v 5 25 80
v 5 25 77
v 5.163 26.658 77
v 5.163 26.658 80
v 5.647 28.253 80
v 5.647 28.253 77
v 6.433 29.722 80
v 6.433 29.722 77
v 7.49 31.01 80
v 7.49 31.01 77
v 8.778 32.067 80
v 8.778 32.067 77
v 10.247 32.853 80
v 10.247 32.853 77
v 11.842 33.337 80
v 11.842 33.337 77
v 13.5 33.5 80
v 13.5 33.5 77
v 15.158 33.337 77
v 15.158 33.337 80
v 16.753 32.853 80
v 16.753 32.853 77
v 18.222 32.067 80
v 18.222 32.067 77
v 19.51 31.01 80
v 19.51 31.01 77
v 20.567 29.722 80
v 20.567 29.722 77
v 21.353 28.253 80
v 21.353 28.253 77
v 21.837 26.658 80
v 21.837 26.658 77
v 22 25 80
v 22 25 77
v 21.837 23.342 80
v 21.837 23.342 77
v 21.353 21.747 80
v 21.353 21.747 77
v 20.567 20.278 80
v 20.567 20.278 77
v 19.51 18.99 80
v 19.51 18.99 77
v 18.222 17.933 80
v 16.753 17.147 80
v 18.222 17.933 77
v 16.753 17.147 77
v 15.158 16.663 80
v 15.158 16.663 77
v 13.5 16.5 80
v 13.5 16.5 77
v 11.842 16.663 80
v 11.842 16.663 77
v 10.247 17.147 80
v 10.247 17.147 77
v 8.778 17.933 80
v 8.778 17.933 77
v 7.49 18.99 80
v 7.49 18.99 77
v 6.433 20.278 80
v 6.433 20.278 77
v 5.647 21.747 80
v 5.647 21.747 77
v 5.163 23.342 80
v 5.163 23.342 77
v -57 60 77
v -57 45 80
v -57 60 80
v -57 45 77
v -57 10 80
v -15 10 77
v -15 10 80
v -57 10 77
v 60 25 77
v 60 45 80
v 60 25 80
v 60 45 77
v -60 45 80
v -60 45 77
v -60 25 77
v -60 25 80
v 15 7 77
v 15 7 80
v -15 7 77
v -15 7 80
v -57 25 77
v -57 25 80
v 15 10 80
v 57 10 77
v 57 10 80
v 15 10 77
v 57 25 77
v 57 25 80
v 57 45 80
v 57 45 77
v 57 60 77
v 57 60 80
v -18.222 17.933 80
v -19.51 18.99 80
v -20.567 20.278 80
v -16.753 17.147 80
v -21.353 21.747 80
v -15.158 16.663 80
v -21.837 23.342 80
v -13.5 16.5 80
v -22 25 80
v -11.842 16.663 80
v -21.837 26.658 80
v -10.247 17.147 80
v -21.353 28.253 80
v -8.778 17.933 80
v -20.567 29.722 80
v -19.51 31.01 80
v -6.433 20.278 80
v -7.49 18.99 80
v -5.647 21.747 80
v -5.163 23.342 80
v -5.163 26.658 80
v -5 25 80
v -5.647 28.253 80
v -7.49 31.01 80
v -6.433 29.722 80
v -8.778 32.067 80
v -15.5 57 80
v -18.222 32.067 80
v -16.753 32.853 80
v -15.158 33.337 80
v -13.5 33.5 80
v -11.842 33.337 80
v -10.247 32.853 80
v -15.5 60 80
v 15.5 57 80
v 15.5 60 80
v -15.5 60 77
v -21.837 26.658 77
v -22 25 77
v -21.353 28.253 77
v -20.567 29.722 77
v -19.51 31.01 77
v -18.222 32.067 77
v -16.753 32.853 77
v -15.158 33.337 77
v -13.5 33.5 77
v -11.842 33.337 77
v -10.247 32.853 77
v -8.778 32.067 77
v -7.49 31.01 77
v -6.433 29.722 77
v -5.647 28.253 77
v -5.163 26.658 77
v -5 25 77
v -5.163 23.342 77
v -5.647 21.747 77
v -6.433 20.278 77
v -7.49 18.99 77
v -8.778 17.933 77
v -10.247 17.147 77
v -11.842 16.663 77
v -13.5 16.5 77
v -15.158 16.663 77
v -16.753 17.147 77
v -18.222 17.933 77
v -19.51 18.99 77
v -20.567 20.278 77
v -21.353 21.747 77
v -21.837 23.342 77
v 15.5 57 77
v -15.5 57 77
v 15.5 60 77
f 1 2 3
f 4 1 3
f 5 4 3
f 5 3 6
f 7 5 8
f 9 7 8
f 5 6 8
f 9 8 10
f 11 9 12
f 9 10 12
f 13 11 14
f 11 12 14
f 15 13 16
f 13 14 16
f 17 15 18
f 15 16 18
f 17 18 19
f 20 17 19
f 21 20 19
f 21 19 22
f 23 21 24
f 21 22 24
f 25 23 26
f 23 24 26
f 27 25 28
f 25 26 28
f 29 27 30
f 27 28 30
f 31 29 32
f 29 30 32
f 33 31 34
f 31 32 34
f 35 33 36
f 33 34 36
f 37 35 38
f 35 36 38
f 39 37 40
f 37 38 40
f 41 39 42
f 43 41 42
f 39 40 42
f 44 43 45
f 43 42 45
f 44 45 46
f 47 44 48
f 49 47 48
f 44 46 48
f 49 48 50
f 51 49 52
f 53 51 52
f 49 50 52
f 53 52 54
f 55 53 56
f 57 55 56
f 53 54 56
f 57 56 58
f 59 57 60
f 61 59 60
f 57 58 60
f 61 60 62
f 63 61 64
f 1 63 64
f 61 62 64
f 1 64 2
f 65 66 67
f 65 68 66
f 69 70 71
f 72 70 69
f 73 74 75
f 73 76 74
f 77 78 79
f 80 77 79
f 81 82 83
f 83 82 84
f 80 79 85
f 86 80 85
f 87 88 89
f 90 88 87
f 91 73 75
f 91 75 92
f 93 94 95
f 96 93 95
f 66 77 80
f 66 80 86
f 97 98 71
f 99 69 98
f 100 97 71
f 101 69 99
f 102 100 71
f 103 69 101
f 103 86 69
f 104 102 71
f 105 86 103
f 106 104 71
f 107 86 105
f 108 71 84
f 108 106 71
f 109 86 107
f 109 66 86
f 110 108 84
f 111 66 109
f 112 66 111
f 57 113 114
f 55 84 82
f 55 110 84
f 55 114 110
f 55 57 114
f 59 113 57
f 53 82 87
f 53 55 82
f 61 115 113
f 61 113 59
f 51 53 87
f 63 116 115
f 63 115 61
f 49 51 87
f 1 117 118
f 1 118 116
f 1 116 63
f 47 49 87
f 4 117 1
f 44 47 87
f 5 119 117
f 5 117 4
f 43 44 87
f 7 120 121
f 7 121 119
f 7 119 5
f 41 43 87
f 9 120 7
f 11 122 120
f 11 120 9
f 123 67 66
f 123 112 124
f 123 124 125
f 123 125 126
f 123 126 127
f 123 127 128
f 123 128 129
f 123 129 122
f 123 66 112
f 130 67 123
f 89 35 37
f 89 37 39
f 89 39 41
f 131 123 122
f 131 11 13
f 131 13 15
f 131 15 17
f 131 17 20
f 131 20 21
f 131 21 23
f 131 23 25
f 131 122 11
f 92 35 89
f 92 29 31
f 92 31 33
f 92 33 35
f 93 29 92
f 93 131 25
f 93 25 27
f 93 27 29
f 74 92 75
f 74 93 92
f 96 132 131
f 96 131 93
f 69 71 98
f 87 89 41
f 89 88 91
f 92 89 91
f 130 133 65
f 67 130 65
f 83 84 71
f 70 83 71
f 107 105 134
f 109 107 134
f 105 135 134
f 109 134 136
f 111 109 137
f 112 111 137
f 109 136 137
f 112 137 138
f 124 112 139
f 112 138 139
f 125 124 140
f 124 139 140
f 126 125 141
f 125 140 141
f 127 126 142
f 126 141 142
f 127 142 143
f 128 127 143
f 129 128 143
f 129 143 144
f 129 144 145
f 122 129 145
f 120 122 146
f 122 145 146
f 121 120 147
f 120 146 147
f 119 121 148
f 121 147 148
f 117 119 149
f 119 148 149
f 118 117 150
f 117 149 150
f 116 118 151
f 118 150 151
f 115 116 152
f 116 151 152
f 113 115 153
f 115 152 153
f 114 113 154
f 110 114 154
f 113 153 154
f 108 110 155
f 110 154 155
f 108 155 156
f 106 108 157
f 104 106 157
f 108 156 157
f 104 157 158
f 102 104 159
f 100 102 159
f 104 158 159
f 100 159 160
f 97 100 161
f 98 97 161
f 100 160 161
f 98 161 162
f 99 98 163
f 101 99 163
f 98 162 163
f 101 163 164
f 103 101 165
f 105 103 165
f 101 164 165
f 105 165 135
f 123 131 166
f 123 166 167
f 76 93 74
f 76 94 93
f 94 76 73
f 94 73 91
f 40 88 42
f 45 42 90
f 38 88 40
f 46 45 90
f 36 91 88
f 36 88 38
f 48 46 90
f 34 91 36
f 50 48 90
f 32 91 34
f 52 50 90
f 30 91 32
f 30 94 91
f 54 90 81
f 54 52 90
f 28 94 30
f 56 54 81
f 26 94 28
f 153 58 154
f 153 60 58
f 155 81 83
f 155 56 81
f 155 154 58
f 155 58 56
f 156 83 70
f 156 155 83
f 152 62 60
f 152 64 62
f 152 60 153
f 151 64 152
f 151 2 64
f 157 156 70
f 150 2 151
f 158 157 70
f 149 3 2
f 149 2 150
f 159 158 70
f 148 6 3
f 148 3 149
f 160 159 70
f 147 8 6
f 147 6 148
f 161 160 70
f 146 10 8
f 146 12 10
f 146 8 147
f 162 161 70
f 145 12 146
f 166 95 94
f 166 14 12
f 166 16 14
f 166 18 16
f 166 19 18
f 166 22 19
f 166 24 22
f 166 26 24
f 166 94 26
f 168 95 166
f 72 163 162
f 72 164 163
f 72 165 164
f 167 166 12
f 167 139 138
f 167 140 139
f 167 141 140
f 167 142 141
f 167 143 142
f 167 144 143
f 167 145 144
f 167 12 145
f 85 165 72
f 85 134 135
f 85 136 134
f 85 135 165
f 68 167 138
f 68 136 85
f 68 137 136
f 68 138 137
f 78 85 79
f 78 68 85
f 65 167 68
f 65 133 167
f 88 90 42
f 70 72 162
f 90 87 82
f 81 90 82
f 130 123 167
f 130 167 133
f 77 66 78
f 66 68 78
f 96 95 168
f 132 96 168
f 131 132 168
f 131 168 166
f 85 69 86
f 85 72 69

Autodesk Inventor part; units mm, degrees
ref_plane "YZ Plane" through (0, 0, 0) normal (1, 0, 0) x (0, 1, 0)
ref_plane "XZ Plane" through (0, 0, 0) normal (0, 1, 0) x (-1, 0, 0)
ref_plane "XY Plane" through (0, 0, 0) normal (0, 0, 1) x (1, 0, 0)
sketch "스케치1" plane through (0, 0, 0) normal (0, 1, 0) x (-1, 0, 0)
  line L0 (60, 80) -> (-60, 80)
  line L1 (-60, 80) -> (-60, -80)
  line L2 (-60, -80) -> (60, -80)
  line L3 (60, -80) -> (60, 80)
  line L4 (60, 80) -> (-60, -80) construction
  line L5 (-60, 80) -> (60, -80) construction
  point P0 (0, 0)
  dimension "d0" = 120
  dimension "d1" = 160
extrude "돌출1" add sketch "스케치1" along normal blind 60
sketch "스케치2" plane through (0, 60, 0) normal (0, 1, 0) x (1, 0, 0)
  line L0 (60, -80) -> (60, 80) projected
  line L1 (60, 80) -> (-60, 80) projected
  line L2 (55, 102.1646) -> (-55, 102.1646)
  line L3 (-55, 102.1646) -> (-55, -89.711)
  line L4 (-55, -89.711) -> (55, -89.711)
  line L5 (55, -89.711) -> (55, 102.1646)
  line L6 (-60, 80) -> (-60, -80) projected
  point P0 (0, 0)
  point P1 (55, 80)
  point P2 (-55, 80)
  dimension "d6" = 5
  dimension "d7" = 5
extrude "돌출2" cut sketch "스케치2" against normal blind 40 contours L5 L4 L3 L1
sketch "스케치12" plane through (60, 0, -80) normal (0, 0, -1) x (-1, 0, 0)
  line L0 (-34.8463, 10) -> (156.2634, 10)
  line L1 (156.2634, 10) -> (156.2634, -36.9465)
  line L2 (156.2634, -36.9465) -> (-34.8463, -36.9465)
  line L3 (-34.8463, -36.9465) -> (-34.8463, 10)
  line L4 (0, 0) -> (120, 0) projected
  point P0 (60, 0)
  dimension "d85" = 10
extrude "돌출10" cut sketch "스케치12" against normal through all
sketch "스케치13" plane through (-55, 20, 80) normal (0, 0, 1) x (1, 0, 0)
  line L0 (0, 40) -> (0, 0) projected
  line L1 (0, 0) -> (110, 0) projected
  line L2 (0, 40) -> (110, 40)
  line L3 (110, 40) -> (110, 0)
  line L4 (110, 0) -> (0, 0)
  line L5 (0, 0) -> (0, 40)
  point P0 (55, -20)
extrude "돌출11" add sketch "스케치13" against normal blind 5
sketch "스케치14" plane through (55, 20, -80) normal (0, 0, -1) x (-1, 0, 0)
  line L0 (0, 0) -> (0, 40) projected
  line L1 (110, 0) -> (0, 0) projected
  line L2 (0, 40) -> (110, 40)
  line L3 (110, 40) -> (110, 0)
  line L4 (110, 0) -> (0, 0)
  line L5 (0, 0) -> (0, 40)
  point P0 (55, -20)
extrude "돌출12" add sketch "스케치14" against normal blind 5
sketch "스케치15" plane through (60, 60, -80) normal (0, 0, -1) x (-1, 0, 0)
  point P0 (60, -60)
sketch "스케치16" plane through (60, 60, -80) normal (0, 0, -1) x (-1, 0, 0)
  point P0 (60, -60)
sketch "스케치17" plane through (0, 20, 0) normal (0, 1, 0) x (1, 0, 0)
  line L0 (7, 27) -> (45, 27)
  line L1 (45, 27) -> (45, 65)
  line L2 (45, 65) -> (7, 65)
  line L3 (7, 65) -> (7, 27)
  line L4 (55, 75) -> (55, -75) projected
  line L5 (55, 75) -> (-55, 75) projected
  circle A0 centre (7, 27) radius 1.6
  circle A1 centre (7, 65) radius 1.6
  circle A2 centre (45, 65) radius 1.6
  circle A3 centre (45, 27) radius 1.6
  line L6 (-47.9371, 14.7215) -> (-7.9371, 14.7215)
  line L7 (-7.9371, 14.7215) -> (-7.9371, 64.7215)
  line L8 (-7.9371, 64.7215) -> (-47.9371, 64.7215)
  line L9 (-47.9371, 64.7215) -> (-47.9371, 14.7215)
  point P0 (0, 0)
  dimension "d92" = 38
  dimension "d93" = 38
  dimension "d95" = 10
  dimension "d96" = 10
  dimension "d97" = 3.2
  dimension "d98" = 3.2
  dimension "d99" = 3.2
  dimension "d100" = 3.2
  dimension "d113" = 40
  dimension "d114" = 50
extrude "돌출13" cut sketch "스케치17" against normal through all contours L3 A0 L0 | L0 A0 L3 | A3 L1 L0 | L0 L1 A3 | A1 L2 L3 | L3 L2 A1 | A2 L2 L1 | L1 L2 A2
sketch "스케치19" plane through (60, 60, -80) normal (0, 0, -1) x (-1, 0, 0)
  line L0 (5, -40) -> (115, -40) projected
  circle A0 centre (46.5, -35) radius 8.5
  circle A1 centre (73.5, -35) radius 8.5
  line L1 (5, 0) -> (5, -40) projected
  line L2 (115, -40) -> (115, 0) projected
  point P0 (60, -60)
  dimension "d105" = 27
  dimension "d106" = 41.5
  dimension "d107" = 17
  dimension "d108" = 17
  dimension "d109" = 5
  dimension "d110" = 5
extrude "돌출14" cut sketch "스케치19" against normal through all
sketch "스케치21" plane through (0, 20, 0) normal (0, 1, 0) x (1, 0, 0)
  circle A0 centre (5.4243, 8.1678) radius 7.5
  line L0 (-49.3888, 17.2731) -> (-9.3888, 17.2731)
  line L1 (-9.3888, 17.2731) -> (-9.3888, 67.2731)
  line L2 (-9.3888, 67.2731) -> (-49.3888, 67.2731)
  line L3 (-49.3888, 67.2731) -> (-49.3888, 17.2731)
  point P0 (0, 0)
  dimension "d117" = 15
  dimension "d118" = 50
  dimension "d119" = 40
extrude "돌출15" cut sketch "스케치21" against normal through all contours A0
sketch "스케치23" plane through (0, 20, 0) normal (0, 1, 0) x (1, 0, 0)
  line L0 (-48.6, -65) -> (20, -65)
  line L1 (20, -65) -> (20, -11.6)
  line L2 (20, -11.6) -> (-48.6, -11.6)
  line L3 (-48.6, -11.6) -> (-48.6, -65)
  line L4 (55, 75) -> (55, -75) projected
  line L5 (-55, -75) -> (55, -75) projected
  circle A0 centre (4.7, -62.45) radius 1.6
  circle A1 centre (6.03, -14.15) radius 1.6
  circle A2 centre (-46.05, -47.16) radius 1.6
  circle A3 centre (-46.05, -19.23) radius 1.6
  point P0 (0, 0)
  dimension "d123" = 68.6
  dimension "d124" = 53.4
  dimension "d125" = 35
  dimension "d126" = 10
  dimension "d127" = 3.2
  dimension "d128" = 15.3
  dimension "d129" = 2.55
  dimension "d130" = 3.2
  dimension "d131" = 13.97
  dimension "d132" = 2.55
  dimension "d133" = 3.2
  dimension "d134" = 35.56
  dimension "d135" = 3.2
  dimension "d136" = 2.55
  dimension "d137" = 2.55
  dimension "d138" = 7.63
extrude "돌출16" cut sketch "스케치23" against normal through all contours A0 | A1 | A2 | A3
sketch "스케치24" plane through (0, 20, 0) normal (0, 1, 0) x (1, 0, 0)
  line L0 (-55, -75) -> (55, -75) projected
  line L1 (55, 75) -> (55, -75) projected
  line L2 (-55, -75) -> (55, -75)
  line L3 (55, -75) -> (55, 75)
  line L4 (55, 75) -> (-55, 75)
  line L5 (-55, 75) -> (-55, -75)
  point P0 (0, 0)
extrude "돌출17" cut sketch "스케치24" against normal through all
sketch "스케치25" plane through (0, 60, 0) normal (0, 1, 0) x (1, 0, 0)
  line L0 (-60, 80) -> (-60, -80) projected
  line L1 (60, -80) -> (60, 80) projected
  line L2 (-60, 80) -> (60, 80)
  line L3 (60, 80) -> (60, -77)
  line L4 (60, -77) -> (-60, -77)
  line L5 (-60, -77) -> (-60, 80)
  line L6 (-60, -80) -> (60, -80) projected
  point P0 (0, 0)
  dimension "d143" = 3
extrude "돌출18" cut sketch "스케치25" against normal through all contours L2 L1 L4 L0
sketch "스케치26" plane through (-60, 60, 80) normal (0, 0, 1) x (1, 0, 0)
  line L0 (120, -50) -> (120, 0) projected
  line L1 (0, -50) -> (120, -50) projected
  line L2 (45, -50) -> (75, -50)
  line L3 (75, -50) -> (75, -53)
  line L4 (75, -53) -> (45, -53)
  line L5 (45, -53) -> (45, -50)
  dimension "d149" = 3
extrude "돌출19" add sketch "스케치26" against normal blind 3
sketch "스케치27" plane through (-60, 60, 80) normal (0, 0, 1) x (1, 0, 0)
  line L0 (116.8483, -15) -> (123, -15)
  line L1 (123, -15) -> (123, -35)
  line L2 (123, -35) -> (116.8483, -35)
  line L3 (116.8483, -35) -> (116.8483, -15)
  line L4 (0, 0) -> (120, 0) projected
  line L5 (120, -50) -> (120, 0) projected
  point P0 (60, -60)
  point P1 (120, -15)
  point P2 (120, -35)
  dimension "d152" = 20
  dimension "d153" = 15
  dimension "d154" = 3
extrude "돌출20" add sketch "스케치27" against normal blind 3 contours L0 L1 L2 L5
mirror "미러3" about plane through (0, 0, 0) normal (1, 0, 0) of "돌출20"
sketch "스케치28" plane through (-60, 60, 80) normal (0, 0, 1) x (1, 0, 0)
  line L0 (44.5, 7.1302) -> (75.5, 7.1302)
  line L1 (75.5, 7.1302) -> (75.5, -3)
  line L2 (75.5, -3) -> (44.5, -3)
  line L3 (44.5, -3) -> (44.5, 7.1302)
  line L4 (120, -15) -> (120, 0) projected
  line L5 (0, 0) -> (120, 0) projected
  point P0 (60, -60)
  point P1 (75.5, 0)
  point P2 (44.5, 0)
  dimension "d157" = 31
  dimension "d158" = 44.5
  dimension "d159" = 3
extrude "돌출21" cut sketch "스케치28" against normal through all contours L5 L1 L2 L3
sketch "스케치29" plane through (60, 10, 77) normal (0, 0, -1) x (-1, 0, 0)
  line L0 (117, 54.1407) -> (145.6874, 54.1407)
  line L1 (145.6874, 54.1407) -> (145.6874, -6.9321)
  line L2 (145.6874, -6.9321) -> (117, -6.9321)
  line L3 (117, -6.9321) -> (117, 54.1407)
  line L4 (120, 50) -> (120, 35) projected
  line L5 (44.5, 47) -> (75.5, 47) projected
  line L6 (60, 47) -> (60, -3)
  line L7 (45, -3) -> (75, -3) projected
  line L8 (3, 54.1407) -> (-25.6874, 54.1407)
  line L9 (-25.6874, 54.1407) -> (-25.6874, -6.9321)
  line L10 (-25.6874, -6.9321) -> (3, -6.9321)
  line L11 (3, -6.9321) -> (3, 54.1407)
  line L12 (0, 50) -> (0, 35)
  point P0 (60, -10)
  dimension "d162" = 3
extrude "돌출22" cut sketch "스케치29" against normal through all
sketch "스케치30" plane through (15, 7, 77) normal (0, 0, -1) x (-1, 0, 0)
  line L0 (64.5699, 38) -> (75, 38)
  line L1 (75, 38) -> (75, 18)
  line L2 (75, 18) -> (64.5699, 18)
  line L3 (64.5699, 18) -> (64.5699, 38)
  line L4 (30.5, 53) -> (72, 53) projected
  line L5 (72, 3) -> (72, 53) projected
  line L6 (-0.5, 50) -> (30.5, 50) projected
  line L7 (15, 50) -> (15, 0)
  line L8 (30, 0) -> (0, 0) projected
  line L9 (-34.5699, 38) -> (-45, 38)
  line L10 (-45, 38) -> (-45, 18)
  line L11 (-45, 18) -> (-34.5699, 18)
  line L12 (-34.5699, 18) -> (-34.5699, 38)
  line L13 (-42, 53) -> (-42, 3) projected
  point P0 (15, -7)
  point P1 (72, 38)
  point P2 (72, 18)
  point P3 (-42, 18)
  point P4 (-42, 38)
  dimension "d165" = 20
  dimension "d166" = 15
  dimension "d167" = 3
extrude "돌출23" add sketch "스케치30" against normal blind 3 contours L0 L1 L2 L5 | L13 L11 L10 L9
sketch "스케치31" plane through (-15, 7, 80) normal (0, 0, 1) x (1, 0, 0)
  point P0 (15, -7)
properties part number "본체 겉면 레이저 앞판"
